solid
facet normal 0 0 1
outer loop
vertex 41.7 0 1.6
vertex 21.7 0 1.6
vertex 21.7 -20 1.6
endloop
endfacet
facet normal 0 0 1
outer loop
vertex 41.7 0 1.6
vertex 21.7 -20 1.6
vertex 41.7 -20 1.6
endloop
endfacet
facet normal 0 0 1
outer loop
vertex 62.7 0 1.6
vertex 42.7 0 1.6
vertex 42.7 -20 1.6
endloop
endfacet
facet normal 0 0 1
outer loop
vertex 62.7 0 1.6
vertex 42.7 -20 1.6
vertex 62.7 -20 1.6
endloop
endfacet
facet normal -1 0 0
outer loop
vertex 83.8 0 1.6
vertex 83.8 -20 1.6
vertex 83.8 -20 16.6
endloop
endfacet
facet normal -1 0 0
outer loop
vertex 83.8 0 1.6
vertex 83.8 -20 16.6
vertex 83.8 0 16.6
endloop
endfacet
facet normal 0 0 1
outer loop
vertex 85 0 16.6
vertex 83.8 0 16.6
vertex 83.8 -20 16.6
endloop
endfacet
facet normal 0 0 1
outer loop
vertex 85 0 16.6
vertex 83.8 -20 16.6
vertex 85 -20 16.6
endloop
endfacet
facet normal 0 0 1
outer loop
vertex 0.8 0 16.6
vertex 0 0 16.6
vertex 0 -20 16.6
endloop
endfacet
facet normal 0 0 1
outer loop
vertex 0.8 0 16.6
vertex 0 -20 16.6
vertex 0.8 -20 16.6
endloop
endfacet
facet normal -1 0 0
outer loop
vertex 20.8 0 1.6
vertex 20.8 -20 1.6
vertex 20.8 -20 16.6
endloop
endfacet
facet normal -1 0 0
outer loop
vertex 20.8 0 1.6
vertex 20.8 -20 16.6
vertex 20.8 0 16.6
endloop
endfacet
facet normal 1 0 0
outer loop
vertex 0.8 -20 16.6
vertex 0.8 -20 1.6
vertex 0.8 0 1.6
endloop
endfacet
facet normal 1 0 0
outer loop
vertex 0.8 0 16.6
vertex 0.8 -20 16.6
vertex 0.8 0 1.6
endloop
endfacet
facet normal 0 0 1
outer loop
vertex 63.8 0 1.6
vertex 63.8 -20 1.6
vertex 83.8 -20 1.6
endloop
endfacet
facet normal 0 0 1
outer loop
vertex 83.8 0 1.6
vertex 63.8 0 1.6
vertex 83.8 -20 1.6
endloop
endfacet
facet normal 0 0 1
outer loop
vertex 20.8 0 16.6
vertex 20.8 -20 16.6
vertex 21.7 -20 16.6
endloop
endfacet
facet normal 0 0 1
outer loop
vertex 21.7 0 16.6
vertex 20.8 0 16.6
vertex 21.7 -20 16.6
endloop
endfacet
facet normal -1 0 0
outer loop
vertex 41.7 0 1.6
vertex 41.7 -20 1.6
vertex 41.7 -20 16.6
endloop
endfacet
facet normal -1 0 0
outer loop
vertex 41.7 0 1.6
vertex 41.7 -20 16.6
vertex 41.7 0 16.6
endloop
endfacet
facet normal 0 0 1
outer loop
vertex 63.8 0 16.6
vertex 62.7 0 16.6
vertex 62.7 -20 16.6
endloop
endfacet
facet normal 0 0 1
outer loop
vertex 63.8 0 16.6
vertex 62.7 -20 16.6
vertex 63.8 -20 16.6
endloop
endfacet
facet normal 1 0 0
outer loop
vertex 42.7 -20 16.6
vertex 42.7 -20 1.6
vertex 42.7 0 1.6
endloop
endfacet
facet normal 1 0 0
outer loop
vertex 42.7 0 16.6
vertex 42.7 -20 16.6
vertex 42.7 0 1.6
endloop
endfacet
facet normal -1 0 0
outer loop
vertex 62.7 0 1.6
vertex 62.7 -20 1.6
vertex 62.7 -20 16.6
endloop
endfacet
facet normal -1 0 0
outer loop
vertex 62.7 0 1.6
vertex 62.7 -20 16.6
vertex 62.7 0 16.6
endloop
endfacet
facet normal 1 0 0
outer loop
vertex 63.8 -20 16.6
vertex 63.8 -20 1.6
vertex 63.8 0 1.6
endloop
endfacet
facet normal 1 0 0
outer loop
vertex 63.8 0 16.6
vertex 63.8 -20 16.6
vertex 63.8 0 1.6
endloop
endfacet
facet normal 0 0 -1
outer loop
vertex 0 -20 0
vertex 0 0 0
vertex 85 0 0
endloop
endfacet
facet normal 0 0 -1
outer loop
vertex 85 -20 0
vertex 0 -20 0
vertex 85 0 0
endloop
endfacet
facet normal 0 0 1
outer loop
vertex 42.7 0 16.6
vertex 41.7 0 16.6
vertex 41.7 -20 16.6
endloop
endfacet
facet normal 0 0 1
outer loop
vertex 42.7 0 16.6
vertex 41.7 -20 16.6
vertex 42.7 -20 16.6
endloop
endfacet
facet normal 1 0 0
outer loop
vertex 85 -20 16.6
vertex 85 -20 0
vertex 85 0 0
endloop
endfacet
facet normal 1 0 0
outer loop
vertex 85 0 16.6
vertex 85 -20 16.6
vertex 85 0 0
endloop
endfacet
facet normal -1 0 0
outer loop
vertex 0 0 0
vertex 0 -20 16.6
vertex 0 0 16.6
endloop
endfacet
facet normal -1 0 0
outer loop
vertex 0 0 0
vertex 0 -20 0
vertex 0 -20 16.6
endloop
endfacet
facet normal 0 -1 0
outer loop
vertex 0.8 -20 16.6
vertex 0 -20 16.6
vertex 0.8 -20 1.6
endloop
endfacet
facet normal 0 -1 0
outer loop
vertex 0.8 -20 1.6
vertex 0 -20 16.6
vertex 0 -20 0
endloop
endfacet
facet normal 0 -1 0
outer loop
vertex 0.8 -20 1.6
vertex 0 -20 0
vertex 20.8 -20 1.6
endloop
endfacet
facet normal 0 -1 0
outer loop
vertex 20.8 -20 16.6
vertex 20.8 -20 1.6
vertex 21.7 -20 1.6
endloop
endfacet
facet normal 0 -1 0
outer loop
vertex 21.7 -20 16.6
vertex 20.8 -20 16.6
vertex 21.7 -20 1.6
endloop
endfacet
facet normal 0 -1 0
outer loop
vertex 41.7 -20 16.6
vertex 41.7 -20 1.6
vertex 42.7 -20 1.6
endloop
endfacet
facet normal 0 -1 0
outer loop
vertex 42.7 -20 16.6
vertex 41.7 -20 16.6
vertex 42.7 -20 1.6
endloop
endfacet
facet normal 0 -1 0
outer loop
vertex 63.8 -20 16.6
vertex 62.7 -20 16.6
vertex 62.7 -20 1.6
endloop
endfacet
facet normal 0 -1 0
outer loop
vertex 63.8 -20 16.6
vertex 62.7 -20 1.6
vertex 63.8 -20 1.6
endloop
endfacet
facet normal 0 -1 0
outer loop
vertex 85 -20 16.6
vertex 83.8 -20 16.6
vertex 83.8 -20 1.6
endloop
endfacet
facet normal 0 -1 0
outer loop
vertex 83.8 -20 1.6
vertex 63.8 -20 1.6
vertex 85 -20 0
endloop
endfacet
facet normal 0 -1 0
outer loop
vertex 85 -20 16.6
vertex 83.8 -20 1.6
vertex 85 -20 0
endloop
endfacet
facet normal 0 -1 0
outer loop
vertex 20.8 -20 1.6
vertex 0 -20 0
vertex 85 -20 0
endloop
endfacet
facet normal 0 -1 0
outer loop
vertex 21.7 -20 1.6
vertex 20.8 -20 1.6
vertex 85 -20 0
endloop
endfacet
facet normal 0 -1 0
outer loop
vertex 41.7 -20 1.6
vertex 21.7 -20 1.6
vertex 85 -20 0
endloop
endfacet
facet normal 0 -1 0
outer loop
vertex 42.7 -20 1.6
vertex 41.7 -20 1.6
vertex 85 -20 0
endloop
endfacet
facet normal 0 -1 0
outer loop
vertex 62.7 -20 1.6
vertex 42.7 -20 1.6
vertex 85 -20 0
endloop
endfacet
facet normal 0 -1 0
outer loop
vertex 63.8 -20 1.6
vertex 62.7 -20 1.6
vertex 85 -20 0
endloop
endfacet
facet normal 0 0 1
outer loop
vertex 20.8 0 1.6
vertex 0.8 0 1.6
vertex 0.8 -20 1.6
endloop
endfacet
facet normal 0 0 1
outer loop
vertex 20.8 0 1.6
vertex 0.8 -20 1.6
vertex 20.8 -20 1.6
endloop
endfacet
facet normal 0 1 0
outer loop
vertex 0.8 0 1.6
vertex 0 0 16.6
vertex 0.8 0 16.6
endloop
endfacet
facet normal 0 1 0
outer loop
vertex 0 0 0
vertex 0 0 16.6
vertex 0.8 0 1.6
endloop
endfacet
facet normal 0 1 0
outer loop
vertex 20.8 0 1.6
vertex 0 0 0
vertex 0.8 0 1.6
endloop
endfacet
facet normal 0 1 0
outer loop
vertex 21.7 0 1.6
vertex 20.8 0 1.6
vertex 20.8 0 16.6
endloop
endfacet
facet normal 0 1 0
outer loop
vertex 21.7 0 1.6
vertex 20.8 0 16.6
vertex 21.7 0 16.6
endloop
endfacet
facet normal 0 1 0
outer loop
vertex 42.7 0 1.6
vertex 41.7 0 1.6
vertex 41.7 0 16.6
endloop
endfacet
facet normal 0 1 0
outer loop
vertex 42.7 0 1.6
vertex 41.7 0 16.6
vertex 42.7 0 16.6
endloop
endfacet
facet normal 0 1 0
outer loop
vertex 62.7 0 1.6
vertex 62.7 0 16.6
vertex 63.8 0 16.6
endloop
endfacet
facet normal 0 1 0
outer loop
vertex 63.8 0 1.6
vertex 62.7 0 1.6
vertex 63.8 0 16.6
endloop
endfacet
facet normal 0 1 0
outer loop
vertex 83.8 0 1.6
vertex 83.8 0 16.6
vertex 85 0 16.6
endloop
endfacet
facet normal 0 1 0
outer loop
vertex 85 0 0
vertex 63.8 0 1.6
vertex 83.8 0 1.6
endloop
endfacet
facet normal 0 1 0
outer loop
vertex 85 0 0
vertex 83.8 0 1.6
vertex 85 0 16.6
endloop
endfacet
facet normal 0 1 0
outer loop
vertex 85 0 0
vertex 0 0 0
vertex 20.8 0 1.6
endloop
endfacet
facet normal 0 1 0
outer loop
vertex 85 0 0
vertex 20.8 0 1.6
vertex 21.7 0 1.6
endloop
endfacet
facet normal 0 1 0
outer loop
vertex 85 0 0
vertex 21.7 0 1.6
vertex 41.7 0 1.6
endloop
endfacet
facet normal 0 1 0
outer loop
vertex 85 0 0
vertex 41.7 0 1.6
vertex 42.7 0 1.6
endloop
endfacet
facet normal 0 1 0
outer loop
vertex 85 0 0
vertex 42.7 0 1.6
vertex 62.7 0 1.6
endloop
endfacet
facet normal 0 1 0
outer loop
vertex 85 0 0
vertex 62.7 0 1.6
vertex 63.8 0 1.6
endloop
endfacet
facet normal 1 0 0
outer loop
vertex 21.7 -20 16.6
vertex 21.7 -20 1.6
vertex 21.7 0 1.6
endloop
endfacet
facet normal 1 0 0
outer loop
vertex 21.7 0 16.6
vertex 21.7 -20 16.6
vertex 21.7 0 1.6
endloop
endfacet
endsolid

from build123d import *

# Parameters (mm, degrees)
F0_W     = 85
F0_H     = 20
F1_DEPTH = 1.6
F2_W     = 0.8
F2_H     = 20
F2_W_2   = 0.9
F2_W_3   = 1
F2_W_4   = 1.1
F2_W_5   = 1.2
F3_DEPTH = 15


with BuildPart() as f1:
    # F0 (on Top) → F1 (new body)
    with BuildSketch(Plane.XY):
        with Locations((42.5, -10)):
            Rectangle(F0_W, F0_H)
    extrude(amount=F1_DEPTH)

    # F2 (on face) → F3 (join)
    with BuildSketch(Plane.XY.offset(1.6)):
        with Locations((0.4, -10)):
            Rectangle(F2_W, F2_H)
        with Locations((21.25, -10)):
            Rectangle(F2_W_2, F2_H)
        with Locations((42.2, -10)):
            Rectangle(F2_W_3, F2_H)
        with Locations((63.25, -10)):
            Rectangle(F2_W_4, F2_H)
        with Locations((84.4, -10)):
            Rectangle(F2_W_5, F2_H)
    extrude(amount=F3_DEPTH)


solid = f1.part
